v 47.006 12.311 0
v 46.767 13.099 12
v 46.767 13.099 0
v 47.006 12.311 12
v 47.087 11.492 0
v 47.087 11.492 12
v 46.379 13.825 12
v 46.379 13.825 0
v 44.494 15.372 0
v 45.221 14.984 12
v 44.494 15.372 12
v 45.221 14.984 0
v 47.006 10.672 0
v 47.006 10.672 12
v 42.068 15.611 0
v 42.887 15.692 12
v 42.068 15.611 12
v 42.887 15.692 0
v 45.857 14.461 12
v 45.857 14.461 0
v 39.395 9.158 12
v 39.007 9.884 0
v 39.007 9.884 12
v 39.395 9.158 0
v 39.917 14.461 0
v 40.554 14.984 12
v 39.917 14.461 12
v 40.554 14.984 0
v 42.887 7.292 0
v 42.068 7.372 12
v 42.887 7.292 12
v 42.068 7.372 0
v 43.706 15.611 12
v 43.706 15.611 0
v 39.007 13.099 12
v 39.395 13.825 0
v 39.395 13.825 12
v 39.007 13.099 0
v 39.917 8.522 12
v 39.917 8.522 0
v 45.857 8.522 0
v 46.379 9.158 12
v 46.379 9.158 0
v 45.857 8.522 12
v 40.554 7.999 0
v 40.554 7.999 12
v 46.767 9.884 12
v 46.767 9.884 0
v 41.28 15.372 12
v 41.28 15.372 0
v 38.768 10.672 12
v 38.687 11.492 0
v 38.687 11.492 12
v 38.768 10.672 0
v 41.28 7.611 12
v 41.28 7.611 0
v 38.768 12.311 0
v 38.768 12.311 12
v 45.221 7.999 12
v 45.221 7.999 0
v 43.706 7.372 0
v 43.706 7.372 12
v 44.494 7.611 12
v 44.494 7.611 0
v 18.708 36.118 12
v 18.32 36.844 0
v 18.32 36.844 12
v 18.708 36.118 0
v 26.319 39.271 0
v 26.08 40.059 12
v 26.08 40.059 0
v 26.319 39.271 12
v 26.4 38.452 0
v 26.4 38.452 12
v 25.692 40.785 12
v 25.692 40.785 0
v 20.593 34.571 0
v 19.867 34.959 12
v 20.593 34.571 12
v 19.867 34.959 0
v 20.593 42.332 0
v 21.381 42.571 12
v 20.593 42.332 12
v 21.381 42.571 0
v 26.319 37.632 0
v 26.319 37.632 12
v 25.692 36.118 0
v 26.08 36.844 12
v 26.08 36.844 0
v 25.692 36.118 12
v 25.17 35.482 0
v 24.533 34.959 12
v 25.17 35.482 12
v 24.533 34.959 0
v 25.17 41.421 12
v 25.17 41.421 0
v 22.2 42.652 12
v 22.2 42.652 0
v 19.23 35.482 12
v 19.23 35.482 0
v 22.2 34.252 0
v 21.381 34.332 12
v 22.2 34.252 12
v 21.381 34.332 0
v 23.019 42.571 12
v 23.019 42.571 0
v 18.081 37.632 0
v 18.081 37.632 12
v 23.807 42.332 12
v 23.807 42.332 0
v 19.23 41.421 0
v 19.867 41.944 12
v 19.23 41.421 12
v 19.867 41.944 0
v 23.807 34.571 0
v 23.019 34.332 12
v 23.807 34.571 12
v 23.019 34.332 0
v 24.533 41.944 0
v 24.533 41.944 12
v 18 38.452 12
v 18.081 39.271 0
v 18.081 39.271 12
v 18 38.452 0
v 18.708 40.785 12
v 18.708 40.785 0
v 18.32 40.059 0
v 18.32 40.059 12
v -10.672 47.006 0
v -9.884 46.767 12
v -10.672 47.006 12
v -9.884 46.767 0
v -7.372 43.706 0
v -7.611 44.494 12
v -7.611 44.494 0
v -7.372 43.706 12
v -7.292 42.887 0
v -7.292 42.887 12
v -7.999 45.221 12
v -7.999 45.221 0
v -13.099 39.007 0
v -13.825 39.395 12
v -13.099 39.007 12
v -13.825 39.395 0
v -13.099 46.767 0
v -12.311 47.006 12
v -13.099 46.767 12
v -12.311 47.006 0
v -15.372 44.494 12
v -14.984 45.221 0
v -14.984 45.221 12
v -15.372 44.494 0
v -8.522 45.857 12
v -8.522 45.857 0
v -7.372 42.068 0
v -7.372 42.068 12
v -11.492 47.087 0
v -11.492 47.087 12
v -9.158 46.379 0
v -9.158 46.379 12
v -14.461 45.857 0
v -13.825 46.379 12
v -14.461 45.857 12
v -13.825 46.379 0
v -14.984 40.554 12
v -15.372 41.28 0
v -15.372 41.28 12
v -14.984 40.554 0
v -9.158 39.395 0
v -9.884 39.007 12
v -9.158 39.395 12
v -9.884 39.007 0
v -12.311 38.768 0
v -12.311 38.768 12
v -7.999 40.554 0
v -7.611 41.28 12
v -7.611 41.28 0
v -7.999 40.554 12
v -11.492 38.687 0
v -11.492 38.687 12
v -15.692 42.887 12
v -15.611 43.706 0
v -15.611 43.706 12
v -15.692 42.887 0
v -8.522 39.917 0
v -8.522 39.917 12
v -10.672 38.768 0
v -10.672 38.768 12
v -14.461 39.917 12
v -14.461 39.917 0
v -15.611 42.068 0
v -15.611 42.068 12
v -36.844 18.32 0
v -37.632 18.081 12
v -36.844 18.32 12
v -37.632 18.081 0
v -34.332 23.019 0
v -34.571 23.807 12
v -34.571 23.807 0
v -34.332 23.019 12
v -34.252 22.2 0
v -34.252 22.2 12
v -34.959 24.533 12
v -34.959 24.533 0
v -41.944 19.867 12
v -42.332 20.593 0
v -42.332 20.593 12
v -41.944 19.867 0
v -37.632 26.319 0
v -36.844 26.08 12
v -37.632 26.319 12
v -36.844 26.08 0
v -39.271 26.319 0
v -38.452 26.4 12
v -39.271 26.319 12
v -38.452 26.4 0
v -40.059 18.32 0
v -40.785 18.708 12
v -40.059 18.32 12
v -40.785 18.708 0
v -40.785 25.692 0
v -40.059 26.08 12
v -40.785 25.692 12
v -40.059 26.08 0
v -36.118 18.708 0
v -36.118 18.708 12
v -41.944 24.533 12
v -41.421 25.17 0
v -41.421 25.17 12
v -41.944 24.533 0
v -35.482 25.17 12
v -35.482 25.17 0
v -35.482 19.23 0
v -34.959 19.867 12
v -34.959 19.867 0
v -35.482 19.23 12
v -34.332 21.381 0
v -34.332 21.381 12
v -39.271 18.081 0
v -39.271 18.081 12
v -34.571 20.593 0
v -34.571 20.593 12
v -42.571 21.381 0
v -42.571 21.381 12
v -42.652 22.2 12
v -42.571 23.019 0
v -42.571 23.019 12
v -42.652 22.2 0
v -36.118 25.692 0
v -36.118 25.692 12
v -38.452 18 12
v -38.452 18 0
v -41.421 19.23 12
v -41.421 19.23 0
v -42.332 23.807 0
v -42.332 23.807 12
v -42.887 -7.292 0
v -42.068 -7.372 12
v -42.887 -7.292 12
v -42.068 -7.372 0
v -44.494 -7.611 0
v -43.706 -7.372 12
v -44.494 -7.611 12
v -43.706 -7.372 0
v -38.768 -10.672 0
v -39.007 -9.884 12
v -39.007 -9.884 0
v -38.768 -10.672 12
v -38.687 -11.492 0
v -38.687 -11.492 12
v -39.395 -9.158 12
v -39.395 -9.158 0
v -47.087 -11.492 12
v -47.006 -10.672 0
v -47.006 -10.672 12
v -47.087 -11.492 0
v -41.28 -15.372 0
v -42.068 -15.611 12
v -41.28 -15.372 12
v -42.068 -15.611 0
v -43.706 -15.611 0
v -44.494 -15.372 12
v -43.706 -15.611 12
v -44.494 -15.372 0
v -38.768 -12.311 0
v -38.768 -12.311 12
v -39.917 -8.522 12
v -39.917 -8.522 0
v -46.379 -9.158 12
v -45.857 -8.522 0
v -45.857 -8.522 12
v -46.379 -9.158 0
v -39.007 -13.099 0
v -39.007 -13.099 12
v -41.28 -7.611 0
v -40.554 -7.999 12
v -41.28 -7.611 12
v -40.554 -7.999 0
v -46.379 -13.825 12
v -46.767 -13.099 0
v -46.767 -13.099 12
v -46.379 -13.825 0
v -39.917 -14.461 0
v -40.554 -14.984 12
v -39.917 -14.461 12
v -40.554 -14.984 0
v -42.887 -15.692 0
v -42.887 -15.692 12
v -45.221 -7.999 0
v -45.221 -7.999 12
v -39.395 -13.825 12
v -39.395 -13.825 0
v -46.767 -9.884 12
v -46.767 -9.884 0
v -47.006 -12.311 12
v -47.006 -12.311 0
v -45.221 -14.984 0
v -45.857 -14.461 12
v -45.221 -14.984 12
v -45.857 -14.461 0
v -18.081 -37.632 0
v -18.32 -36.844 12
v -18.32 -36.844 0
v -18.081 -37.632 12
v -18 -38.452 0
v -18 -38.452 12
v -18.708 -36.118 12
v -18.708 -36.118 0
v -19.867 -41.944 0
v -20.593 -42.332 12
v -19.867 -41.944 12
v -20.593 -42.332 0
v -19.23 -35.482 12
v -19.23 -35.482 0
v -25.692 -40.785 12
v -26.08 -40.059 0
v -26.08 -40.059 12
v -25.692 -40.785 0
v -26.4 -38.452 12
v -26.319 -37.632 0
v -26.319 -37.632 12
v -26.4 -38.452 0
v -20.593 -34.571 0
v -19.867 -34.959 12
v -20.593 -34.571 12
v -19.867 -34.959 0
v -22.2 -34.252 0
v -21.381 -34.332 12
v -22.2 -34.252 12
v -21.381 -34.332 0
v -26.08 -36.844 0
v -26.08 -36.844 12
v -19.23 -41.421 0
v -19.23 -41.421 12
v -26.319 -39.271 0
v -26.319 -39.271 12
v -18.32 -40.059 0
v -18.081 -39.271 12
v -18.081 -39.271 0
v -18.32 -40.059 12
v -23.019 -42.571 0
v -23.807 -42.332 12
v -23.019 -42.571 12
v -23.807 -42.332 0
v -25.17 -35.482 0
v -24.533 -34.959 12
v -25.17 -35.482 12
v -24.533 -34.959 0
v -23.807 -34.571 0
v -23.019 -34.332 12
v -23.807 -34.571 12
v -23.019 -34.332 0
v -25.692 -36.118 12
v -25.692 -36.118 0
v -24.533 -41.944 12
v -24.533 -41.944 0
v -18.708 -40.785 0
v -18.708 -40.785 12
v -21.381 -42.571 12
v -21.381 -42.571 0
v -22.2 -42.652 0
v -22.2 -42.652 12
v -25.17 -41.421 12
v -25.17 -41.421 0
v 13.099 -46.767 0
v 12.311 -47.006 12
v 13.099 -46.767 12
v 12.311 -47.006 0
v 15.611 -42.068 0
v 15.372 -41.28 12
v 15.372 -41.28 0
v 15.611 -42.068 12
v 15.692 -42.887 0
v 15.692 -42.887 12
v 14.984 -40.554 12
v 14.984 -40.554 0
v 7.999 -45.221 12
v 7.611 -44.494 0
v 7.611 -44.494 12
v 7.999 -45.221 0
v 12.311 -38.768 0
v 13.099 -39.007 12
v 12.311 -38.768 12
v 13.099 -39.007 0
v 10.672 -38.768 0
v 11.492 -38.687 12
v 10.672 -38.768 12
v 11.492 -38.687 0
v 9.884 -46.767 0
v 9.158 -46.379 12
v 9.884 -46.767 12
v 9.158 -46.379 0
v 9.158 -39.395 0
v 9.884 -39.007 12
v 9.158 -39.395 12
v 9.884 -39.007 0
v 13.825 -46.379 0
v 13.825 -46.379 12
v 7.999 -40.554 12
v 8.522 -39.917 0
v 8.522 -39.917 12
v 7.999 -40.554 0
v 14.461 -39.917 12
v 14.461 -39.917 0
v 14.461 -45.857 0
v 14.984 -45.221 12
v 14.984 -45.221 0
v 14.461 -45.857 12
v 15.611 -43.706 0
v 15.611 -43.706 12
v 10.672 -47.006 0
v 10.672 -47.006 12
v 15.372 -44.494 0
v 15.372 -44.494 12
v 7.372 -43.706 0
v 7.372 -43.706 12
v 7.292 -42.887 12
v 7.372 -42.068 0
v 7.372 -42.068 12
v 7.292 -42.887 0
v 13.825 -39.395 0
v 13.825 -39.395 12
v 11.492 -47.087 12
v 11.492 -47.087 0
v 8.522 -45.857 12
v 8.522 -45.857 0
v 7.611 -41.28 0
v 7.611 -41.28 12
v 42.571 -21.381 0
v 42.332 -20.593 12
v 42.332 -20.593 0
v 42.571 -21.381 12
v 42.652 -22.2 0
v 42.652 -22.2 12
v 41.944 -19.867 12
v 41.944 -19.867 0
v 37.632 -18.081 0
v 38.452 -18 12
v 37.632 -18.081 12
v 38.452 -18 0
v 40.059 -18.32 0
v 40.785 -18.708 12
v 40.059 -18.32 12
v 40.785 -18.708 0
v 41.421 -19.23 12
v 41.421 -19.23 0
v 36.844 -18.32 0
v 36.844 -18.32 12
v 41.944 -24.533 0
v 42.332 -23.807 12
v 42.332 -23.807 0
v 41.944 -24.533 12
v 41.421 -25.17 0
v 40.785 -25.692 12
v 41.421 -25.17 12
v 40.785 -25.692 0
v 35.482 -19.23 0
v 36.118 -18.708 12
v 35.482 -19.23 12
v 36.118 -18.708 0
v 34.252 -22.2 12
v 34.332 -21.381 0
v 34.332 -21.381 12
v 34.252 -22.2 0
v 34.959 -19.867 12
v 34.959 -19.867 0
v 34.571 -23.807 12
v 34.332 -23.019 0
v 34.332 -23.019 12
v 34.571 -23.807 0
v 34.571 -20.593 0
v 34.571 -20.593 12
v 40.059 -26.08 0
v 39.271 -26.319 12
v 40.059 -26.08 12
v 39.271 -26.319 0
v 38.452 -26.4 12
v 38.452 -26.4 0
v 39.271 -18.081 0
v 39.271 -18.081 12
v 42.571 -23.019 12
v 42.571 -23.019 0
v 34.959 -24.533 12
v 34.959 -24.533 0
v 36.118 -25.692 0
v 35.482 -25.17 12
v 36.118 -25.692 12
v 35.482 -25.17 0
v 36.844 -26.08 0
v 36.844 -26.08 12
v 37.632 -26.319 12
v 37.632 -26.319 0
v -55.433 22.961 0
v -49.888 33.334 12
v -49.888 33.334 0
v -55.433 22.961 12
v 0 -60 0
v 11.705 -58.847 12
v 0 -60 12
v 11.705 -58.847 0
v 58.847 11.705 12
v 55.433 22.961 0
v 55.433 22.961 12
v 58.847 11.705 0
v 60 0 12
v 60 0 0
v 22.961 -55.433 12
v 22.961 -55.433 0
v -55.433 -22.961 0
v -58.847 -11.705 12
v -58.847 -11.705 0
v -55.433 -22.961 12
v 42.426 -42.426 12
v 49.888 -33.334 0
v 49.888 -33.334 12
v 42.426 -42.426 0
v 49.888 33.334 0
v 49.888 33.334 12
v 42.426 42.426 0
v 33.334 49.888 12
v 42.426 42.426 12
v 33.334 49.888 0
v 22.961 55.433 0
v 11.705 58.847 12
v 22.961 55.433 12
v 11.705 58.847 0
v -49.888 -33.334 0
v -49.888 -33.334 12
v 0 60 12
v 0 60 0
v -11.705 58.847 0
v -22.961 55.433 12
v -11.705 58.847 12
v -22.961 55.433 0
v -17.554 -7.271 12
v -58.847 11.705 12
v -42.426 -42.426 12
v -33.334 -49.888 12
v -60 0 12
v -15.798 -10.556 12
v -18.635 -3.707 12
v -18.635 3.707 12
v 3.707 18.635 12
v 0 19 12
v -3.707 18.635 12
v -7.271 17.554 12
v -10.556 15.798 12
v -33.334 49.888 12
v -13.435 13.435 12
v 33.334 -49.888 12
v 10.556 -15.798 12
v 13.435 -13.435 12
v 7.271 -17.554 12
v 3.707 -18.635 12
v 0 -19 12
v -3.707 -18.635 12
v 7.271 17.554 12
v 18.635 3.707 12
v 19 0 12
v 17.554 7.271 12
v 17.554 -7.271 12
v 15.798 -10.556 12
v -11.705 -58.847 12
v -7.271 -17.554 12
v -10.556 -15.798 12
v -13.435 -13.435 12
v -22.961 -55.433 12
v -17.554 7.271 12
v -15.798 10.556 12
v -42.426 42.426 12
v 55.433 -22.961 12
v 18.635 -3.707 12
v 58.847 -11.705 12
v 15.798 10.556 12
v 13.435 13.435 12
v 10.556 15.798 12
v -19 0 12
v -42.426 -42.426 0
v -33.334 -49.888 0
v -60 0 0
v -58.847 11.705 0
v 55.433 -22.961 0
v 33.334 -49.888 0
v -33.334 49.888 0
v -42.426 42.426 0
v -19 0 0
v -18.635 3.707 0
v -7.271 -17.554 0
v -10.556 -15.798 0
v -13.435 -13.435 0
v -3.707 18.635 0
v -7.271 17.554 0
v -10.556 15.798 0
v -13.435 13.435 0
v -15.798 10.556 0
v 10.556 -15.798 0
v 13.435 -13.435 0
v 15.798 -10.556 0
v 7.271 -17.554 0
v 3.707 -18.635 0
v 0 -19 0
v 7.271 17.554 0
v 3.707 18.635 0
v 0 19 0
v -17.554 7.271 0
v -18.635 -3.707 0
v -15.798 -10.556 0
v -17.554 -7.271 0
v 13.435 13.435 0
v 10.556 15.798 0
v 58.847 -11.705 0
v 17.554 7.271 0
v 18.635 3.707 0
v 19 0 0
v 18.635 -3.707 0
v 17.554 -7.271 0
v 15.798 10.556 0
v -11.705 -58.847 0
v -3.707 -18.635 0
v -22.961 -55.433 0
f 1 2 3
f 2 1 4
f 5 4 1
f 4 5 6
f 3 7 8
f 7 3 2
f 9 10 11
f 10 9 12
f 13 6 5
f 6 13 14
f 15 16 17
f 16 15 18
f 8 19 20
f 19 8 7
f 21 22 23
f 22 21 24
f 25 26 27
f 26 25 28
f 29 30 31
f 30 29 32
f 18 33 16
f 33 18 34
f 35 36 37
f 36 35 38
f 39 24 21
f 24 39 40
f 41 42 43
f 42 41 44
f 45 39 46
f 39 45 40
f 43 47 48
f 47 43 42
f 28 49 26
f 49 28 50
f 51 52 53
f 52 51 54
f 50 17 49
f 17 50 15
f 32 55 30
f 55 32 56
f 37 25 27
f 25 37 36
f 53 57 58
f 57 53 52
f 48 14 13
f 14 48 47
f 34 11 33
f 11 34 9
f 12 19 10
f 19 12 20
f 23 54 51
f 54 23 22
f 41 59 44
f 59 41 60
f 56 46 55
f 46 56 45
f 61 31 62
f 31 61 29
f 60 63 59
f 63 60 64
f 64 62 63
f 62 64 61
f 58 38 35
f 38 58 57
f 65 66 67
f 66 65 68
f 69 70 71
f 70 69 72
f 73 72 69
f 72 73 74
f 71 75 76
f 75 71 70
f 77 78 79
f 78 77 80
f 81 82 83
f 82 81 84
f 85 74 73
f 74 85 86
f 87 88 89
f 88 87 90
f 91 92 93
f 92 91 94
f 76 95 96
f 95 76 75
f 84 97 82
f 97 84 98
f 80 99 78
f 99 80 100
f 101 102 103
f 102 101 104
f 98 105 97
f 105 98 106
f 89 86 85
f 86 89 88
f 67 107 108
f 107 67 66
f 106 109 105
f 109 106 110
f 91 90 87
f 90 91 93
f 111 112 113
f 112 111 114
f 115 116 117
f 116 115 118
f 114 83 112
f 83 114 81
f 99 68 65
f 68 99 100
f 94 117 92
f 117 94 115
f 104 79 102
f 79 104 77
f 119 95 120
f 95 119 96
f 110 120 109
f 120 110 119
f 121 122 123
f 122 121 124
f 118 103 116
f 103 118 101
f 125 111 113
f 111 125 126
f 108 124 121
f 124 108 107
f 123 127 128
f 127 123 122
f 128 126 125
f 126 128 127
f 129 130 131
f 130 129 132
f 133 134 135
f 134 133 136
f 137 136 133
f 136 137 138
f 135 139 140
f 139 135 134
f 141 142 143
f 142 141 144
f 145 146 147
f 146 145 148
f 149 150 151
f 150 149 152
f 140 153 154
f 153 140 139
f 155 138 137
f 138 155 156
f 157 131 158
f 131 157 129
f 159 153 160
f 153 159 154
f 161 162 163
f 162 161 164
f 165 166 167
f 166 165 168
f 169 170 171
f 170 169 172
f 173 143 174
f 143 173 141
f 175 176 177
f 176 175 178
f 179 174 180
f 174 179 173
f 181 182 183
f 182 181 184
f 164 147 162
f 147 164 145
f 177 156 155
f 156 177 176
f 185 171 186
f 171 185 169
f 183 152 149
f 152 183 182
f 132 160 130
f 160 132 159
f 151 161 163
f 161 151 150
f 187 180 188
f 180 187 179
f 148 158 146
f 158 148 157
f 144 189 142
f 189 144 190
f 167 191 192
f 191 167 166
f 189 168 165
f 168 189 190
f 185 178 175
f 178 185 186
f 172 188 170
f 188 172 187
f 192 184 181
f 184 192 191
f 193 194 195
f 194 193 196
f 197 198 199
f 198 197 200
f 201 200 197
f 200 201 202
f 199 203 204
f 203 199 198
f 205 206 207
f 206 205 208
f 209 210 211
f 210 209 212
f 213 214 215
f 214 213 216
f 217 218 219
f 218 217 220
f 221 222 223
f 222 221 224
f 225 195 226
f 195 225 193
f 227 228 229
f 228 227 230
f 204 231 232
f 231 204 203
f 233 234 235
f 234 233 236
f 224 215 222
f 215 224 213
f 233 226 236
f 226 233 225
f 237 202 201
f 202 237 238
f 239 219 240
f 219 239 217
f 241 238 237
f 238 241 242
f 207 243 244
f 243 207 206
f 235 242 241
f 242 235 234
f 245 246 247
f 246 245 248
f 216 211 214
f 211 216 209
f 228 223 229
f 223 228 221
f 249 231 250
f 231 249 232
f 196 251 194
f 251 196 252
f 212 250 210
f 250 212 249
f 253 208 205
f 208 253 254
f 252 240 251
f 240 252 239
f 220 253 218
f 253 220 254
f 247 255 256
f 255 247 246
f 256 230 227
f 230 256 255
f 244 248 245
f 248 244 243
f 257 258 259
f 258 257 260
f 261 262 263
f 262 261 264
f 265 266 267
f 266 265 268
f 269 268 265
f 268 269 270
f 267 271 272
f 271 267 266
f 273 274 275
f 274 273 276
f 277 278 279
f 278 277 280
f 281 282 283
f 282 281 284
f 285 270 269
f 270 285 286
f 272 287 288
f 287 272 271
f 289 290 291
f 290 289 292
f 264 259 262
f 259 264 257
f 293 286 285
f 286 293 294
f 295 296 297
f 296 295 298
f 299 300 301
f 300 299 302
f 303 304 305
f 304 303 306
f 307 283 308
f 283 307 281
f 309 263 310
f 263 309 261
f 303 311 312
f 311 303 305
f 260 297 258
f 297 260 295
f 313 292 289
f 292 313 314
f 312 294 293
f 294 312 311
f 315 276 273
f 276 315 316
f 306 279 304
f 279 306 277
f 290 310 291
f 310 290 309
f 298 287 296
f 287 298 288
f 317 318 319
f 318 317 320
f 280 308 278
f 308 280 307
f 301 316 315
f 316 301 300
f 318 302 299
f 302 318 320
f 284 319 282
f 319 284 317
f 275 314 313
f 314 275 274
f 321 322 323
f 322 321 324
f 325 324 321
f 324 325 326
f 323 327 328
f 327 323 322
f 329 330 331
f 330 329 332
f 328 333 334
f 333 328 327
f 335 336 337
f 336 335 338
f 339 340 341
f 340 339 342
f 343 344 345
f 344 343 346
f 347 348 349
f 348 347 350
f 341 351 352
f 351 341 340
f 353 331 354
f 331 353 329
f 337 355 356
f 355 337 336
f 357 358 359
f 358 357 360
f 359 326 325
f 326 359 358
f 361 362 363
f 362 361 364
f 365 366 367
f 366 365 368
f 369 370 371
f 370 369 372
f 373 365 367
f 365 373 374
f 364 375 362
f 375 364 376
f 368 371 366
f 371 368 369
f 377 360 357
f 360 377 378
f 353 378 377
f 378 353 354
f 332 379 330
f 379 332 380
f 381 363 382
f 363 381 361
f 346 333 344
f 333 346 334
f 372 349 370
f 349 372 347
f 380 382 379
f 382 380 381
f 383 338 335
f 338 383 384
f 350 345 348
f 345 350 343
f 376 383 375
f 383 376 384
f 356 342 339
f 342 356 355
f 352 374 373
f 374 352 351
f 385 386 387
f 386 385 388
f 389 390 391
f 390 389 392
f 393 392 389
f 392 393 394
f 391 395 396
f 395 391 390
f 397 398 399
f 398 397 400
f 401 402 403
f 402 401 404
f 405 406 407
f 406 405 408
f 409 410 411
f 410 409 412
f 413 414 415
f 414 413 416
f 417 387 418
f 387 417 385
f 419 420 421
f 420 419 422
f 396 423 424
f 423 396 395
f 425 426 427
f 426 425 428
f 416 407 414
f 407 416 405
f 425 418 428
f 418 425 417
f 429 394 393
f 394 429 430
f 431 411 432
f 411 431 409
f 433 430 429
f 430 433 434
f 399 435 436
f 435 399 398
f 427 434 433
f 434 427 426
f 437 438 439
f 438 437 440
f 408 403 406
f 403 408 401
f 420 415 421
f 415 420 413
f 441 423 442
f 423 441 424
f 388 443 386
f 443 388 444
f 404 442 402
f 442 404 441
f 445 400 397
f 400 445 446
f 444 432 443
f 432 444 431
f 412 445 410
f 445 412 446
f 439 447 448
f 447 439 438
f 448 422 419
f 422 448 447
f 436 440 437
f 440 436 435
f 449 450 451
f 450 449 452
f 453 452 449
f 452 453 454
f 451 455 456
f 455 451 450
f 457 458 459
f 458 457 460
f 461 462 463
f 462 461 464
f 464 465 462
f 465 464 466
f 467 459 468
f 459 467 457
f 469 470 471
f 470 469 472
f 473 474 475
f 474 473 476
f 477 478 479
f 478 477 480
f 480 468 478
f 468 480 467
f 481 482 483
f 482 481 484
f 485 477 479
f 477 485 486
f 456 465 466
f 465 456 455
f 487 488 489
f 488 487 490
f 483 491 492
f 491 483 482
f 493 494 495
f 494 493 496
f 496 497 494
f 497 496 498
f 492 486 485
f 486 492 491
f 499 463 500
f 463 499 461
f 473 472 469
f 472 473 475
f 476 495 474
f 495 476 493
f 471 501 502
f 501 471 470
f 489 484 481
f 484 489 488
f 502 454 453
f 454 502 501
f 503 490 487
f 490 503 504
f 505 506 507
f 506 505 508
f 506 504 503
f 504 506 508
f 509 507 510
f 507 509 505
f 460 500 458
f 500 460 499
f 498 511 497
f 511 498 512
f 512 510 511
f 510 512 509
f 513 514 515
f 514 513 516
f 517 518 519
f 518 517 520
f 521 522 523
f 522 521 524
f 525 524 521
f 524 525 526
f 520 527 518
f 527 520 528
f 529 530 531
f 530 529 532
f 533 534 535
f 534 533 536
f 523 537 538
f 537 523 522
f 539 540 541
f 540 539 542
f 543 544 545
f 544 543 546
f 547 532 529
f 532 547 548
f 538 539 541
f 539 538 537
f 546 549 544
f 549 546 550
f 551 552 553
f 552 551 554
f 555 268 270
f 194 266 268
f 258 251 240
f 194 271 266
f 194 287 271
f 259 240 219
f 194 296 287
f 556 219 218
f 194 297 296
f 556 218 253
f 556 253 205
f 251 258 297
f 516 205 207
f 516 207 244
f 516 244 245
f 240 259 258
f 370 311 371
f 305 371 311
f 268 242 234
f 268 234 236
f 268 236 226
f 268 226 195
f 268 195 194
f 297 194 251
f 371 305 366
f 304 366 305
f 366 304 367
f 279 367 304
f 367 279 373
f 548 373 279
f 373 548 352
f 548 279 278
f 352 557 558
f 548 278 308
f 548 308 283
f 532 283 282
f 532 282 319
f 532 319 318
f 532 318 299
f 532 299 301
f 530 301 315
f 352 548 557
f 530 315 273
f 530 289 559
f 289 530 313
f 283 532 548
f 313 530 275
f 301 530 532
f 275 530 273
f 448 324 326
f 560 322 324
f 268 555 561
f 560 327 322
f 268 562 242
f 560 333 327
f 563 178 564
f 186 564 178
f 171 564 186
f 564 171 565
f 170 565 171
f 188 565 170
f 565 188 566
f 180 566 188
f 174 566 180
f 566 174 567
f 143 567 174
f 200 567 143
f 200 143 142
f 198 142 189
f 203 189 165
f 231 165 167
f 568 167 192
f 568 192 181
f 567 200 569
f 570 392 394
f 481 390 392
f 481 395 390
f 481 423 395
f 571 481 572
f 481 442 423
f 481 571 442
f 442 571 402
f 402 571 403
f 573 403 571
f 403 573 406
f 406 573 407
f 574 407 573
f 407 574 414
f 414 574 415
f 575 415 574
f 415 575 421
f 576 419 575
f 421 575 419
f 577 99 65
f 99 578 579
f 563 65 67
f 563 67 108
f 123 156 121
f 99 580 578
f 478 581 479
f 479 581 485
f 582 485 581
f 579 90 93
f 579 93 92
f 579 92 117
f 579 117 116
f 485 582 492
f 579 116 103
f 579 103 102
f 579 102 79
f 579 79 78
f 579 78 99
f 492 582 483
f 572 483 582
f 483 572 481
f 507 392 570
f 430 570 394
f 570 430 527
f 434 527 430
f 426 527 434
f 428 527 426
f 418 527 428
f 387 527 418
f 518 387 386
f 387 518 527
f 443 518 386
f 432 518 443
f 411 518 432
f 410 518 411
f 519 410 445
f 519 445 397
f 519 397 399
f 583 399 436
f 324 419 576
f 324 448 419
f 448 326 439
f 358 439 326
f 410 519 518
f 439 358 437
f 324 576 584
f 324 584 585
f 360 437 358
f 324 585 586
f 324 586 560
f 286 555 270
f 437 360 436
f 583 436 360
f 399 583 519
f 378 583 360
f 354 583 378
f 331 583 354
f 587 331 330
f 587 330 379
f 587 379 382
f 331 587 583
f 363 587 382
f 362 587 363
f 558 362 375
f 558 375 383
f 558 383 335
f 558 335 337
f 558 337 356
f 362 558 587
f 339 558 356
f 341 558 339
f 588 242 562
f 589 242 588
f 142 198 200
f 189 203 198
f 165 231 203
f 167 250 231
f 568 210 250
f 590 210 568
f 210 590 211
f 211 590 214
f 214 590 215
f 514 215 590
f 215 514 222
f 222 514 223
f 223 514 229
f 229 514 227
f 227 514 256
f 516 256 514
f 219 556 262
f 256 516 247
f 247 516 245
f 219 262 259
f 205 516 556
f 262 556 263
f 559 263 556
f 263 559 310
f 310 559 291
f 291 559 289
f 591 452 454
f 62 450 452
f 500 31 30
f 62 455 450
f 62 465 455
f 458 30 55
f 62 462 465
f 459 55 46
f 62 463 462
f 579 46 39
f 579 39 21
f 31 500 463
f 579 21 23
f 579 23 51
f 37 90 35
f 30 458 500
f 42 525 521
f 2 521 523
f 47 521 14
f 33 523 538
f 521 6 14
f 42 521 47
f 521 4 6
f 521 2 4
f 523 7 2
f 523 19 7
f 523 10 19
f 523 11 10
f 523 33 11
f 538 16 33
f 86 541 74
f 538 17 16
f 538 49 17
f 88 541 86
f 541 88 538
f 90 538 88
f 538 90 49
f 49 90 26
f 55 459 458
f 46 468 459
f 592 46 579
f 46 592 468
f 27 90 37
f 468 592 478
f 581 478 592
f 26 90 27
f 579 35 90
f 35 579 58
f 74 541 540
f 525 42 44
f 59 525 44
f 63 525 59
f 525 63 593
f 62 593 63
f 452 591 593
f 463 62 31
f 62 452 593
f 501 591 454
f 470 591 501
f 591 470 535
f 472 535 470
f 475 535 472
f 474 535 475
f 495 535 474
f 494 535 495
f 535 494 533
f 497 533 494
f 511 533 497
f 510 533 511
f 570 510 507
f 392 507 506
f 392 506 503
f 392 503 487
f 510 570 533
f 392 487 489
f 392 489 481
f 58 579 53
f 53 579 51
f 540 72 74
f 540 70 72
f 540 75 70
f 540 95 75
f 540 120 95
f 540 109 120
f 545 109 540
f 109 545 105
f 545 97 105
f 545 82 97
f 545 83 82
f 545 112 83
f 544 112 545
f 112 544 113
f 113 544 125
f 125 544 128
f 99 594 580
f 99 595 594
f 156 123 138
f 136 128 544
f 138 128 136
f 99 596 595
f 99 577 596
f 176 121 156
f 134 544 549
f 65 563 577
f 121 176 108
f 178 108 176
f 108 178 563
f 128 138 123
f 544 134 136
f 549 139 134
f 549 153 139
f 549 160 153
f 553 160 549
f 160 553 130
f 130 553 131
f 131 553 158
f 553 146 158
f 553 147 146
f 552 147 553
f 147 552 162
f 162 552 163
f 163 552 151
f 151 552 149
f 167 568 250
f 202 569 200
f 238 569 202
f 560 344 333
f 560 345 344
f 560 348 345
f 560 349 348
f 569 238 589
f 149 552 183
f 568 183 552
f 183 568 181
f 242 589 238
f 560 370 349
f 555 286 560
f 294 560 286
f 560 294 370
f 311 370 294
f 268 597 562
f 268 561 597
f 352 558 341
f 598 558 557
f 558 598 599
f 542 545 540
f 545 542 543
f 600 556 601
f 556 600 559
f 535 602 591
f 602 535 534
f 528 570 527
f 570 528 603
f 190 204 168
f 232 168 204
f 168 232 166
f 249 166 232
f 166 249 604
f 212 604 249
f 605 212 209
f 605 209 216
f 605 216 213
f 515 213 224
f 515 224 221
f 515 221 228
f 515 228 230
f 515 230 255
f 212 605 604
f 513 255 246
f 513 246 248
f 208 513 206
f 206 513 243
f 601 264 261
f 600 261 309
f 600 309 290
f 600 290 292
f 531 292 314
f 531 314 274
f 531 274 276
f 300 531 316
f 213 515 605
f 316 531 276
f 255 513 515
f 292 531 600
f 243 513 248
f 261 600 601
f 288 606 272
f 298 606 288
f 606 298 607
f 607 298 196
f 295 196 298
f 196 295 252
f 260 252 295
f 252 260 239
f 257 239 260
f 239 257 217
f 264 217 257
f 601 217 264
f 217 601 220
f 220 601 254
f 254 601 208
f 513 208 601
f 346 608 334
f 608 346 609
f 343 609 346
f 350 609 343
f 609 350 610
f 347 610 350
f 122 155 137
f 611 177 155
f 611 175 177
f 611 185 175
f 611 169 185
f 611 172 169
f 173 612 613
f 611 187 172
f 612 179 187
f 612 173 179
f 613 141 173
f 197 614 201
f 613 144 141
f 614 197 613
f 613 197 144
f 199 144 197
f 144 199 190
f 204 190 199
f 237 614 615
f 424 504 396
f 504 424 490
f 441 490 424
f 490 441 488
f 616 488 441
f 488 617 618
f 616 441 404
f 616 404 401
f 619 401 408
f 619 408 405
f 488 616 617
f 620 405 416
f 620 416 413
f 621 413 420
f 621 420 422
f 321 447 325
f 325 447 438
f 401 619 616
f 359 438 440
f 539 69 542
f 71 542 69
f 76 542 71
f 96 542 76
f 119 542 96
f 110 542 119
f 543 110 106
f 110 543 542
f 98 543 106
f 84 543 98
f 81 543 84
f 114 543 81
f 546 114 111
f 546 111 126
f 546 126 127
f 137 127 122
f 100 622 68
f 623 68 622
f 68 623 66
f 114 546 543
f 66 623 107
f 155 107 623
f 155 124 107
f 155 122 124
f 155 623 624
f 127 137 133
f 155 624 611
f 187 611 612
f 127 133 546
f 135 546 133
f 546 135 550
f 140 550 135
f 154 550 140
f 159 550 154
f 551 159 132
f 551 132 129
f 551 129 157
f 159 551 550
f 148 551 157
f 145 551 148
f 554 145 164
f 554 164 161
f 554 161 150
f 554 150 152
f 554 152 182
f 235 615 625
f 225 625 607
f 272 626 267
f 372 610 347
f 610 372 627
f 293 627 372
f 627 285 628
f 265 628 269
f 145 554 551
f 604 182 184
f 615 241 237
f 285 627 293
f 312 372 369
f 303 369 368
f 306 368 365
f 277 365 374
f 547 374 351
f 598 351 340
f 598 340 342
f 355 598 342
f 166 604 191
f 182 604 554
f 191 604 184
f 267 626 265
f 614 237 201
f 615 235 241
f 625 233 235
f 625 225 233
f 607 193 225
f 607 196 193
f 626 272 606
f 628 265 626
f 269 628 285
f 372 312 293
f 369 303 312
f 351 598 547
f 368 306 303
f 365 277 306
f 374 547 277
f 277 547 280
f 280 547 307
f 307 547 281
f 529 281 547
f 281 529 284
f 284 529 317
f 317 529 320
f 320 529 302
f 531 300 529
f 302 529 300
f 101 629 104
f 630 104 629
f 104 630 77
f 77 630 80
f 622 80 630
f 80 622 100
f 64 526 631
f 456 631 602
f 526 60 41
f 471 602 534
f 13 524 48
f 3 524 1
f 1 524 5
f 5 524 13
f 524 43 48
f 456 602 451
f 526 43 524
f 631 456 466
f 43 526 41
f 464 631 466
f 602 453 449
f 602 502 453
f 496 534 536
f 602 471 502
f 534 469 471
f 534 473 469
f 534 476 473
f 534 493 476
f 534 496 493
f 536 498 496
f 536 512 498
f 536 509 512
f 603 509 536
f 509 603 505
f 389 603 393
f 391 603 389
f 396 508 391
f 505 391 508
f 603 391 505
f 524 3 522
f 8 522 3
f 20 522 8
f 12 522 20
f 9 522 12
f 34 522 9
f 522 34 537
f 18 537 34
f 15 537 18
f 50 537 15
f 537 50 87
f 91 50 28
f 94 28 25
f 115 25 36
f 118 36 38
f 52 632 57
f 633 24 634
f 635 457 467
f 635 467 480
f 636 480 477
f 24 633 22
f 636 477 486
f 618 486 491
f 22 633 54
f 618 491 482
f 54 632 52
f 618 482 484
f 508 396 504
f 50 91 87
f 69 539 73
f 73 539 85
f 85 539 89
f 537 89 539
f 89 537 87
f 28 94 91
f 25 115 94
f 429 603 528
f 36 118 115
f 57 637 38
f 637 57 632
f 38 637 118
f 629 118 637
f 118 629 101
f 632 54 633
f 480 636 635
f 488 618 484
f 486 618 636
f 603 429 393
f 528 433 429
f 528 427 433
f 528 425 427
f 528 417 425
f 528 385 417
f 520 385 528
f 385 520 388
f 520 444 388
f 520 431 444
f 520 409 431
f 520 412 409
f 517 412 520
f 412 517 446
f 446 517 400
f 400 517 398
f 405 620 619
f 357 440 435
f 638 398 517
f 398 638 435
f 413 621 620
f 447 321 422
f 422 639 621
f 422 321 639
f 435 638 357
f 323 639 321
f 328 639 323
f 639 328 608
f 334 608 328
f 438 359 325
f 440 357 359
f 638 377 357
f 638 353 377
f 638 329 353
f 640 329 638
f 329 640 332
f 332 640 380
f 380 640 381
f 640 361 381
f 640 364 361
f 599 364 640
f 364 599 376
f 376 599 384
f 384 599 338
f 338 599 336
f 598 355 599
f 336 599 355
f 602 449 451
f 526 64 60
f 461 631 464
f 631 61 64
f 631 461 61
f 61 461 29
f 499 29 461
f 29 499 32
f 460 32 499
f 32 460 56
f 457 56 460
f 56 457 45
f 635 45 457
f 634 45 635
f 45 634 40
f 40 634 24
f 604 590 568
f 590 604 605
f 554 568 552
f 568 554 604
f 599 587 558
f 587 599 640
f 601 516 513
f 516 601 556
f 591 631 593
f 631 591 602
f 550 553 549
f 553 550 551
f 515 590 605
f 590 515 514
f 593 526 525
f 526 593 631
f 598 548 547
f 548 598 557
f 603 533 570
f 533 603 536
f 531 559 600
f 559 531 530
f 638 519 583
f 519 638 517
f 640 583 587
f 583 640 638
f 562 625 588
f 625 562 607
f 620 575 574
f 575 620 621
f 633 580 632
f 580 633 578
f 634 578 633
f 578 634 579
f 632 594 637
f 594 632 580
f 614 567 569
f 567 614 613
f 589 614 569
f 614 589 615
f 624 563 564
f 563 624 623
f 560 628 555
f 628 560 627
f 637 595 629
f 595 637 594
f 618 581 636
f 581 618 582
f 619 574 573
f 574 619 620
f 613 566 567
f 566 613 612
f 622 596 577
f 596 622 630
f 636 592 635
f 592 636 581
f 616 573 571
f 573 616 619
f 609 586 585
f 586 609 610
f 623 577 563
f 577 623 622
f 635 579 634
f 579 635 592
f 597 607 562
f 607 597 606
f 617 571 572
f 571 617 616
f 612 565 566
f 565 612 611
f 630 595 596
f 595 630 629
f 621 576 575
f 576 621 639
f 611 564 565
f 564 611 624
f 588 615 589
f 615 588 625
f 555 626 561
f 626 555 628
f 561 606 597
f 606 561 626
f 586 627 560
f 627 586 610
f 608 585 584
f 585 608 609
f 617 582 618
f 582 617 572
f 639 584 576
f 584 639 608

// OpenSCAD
$fn = 32;

// ----------------------------------------------------------------------
// Flange Ø120 x 12
// 8 holes on a Ø88.8 bolt circle, bolted joints
// ----------------------------------------------------------------------

// --- parameters (mm) ---
flange_d = 120;  // outside diameter of the flange
thickness = 12;  // flange thickness
holes = 8;       // number of bolt holes
pcd = 88.8;      // bolt circle diameter
start_deg = 15;  // angle of the first hole, from +X
hole_d = 8.4;    // bolt hole diameter
bore_d = 38;     // central through bore
hub_d = 48;      // hub outside diameter
hub_h = 0;       // hub height above the flange face (0 = no hub)

// --- derived feature positions (mm) ---
height = thickness + hub_h;  // = 12   overall height of the part
pcd_r = pcd / 2;             // = 44.4   bolt circle radius
hole_step = 360 / holes;     // = 45   angular pitch
feature_centers = [
  [pcd_r * cos(start_deg + 0 * hole_step), pcd_r * sin(start_deg + 0 * hole_step)],
  [pcd_r * cos(start_deg + 1 * hole_step), pcd_r * sin(start_deg + 1 * hole_step)],
  [pcd_r * cos(start_deg + 2 * hole_step), pcd_r * sin(start_deg + 2 * hole_step)],
  [pcd_r * cos(start_deg + 3 * hole_step), pcd_r * sin(start_deg + 3 * hole_step)],
  [pcd_r * cos(start_deg + 4 * hole_step), pcd_r * sin(start_deg + 4 * hole_step)],
  [pcd_r * cos(start_deg + 5 * hole_step), pcd_r * sin(start_deg + 5 * hole_step)],
  [pcd_r * cos(start_deg + 6 * hole_step), pcd_r * sin(start_deg + 6 * hole_step)],
  [pcd_r * cos(start_deg + 7 * hole_step), pcd_r * sin(start_deg + 7 * hole_step)]
];   // bolt hole centres on the pitch circle

// flange disc, every hole and the bore cut straight through
difference() {
  union() {
    cylinder(d = flange_d, h = thickness);
  }
  translate([0, 0, -1]) cylinder(d = bore_d, h = height + 2);  // bore, through
  for (centre = feature_centers)
    translate([centre[0], centre[1], -1]) cylinder(d = hole_d, h = thickness + 2);
}
